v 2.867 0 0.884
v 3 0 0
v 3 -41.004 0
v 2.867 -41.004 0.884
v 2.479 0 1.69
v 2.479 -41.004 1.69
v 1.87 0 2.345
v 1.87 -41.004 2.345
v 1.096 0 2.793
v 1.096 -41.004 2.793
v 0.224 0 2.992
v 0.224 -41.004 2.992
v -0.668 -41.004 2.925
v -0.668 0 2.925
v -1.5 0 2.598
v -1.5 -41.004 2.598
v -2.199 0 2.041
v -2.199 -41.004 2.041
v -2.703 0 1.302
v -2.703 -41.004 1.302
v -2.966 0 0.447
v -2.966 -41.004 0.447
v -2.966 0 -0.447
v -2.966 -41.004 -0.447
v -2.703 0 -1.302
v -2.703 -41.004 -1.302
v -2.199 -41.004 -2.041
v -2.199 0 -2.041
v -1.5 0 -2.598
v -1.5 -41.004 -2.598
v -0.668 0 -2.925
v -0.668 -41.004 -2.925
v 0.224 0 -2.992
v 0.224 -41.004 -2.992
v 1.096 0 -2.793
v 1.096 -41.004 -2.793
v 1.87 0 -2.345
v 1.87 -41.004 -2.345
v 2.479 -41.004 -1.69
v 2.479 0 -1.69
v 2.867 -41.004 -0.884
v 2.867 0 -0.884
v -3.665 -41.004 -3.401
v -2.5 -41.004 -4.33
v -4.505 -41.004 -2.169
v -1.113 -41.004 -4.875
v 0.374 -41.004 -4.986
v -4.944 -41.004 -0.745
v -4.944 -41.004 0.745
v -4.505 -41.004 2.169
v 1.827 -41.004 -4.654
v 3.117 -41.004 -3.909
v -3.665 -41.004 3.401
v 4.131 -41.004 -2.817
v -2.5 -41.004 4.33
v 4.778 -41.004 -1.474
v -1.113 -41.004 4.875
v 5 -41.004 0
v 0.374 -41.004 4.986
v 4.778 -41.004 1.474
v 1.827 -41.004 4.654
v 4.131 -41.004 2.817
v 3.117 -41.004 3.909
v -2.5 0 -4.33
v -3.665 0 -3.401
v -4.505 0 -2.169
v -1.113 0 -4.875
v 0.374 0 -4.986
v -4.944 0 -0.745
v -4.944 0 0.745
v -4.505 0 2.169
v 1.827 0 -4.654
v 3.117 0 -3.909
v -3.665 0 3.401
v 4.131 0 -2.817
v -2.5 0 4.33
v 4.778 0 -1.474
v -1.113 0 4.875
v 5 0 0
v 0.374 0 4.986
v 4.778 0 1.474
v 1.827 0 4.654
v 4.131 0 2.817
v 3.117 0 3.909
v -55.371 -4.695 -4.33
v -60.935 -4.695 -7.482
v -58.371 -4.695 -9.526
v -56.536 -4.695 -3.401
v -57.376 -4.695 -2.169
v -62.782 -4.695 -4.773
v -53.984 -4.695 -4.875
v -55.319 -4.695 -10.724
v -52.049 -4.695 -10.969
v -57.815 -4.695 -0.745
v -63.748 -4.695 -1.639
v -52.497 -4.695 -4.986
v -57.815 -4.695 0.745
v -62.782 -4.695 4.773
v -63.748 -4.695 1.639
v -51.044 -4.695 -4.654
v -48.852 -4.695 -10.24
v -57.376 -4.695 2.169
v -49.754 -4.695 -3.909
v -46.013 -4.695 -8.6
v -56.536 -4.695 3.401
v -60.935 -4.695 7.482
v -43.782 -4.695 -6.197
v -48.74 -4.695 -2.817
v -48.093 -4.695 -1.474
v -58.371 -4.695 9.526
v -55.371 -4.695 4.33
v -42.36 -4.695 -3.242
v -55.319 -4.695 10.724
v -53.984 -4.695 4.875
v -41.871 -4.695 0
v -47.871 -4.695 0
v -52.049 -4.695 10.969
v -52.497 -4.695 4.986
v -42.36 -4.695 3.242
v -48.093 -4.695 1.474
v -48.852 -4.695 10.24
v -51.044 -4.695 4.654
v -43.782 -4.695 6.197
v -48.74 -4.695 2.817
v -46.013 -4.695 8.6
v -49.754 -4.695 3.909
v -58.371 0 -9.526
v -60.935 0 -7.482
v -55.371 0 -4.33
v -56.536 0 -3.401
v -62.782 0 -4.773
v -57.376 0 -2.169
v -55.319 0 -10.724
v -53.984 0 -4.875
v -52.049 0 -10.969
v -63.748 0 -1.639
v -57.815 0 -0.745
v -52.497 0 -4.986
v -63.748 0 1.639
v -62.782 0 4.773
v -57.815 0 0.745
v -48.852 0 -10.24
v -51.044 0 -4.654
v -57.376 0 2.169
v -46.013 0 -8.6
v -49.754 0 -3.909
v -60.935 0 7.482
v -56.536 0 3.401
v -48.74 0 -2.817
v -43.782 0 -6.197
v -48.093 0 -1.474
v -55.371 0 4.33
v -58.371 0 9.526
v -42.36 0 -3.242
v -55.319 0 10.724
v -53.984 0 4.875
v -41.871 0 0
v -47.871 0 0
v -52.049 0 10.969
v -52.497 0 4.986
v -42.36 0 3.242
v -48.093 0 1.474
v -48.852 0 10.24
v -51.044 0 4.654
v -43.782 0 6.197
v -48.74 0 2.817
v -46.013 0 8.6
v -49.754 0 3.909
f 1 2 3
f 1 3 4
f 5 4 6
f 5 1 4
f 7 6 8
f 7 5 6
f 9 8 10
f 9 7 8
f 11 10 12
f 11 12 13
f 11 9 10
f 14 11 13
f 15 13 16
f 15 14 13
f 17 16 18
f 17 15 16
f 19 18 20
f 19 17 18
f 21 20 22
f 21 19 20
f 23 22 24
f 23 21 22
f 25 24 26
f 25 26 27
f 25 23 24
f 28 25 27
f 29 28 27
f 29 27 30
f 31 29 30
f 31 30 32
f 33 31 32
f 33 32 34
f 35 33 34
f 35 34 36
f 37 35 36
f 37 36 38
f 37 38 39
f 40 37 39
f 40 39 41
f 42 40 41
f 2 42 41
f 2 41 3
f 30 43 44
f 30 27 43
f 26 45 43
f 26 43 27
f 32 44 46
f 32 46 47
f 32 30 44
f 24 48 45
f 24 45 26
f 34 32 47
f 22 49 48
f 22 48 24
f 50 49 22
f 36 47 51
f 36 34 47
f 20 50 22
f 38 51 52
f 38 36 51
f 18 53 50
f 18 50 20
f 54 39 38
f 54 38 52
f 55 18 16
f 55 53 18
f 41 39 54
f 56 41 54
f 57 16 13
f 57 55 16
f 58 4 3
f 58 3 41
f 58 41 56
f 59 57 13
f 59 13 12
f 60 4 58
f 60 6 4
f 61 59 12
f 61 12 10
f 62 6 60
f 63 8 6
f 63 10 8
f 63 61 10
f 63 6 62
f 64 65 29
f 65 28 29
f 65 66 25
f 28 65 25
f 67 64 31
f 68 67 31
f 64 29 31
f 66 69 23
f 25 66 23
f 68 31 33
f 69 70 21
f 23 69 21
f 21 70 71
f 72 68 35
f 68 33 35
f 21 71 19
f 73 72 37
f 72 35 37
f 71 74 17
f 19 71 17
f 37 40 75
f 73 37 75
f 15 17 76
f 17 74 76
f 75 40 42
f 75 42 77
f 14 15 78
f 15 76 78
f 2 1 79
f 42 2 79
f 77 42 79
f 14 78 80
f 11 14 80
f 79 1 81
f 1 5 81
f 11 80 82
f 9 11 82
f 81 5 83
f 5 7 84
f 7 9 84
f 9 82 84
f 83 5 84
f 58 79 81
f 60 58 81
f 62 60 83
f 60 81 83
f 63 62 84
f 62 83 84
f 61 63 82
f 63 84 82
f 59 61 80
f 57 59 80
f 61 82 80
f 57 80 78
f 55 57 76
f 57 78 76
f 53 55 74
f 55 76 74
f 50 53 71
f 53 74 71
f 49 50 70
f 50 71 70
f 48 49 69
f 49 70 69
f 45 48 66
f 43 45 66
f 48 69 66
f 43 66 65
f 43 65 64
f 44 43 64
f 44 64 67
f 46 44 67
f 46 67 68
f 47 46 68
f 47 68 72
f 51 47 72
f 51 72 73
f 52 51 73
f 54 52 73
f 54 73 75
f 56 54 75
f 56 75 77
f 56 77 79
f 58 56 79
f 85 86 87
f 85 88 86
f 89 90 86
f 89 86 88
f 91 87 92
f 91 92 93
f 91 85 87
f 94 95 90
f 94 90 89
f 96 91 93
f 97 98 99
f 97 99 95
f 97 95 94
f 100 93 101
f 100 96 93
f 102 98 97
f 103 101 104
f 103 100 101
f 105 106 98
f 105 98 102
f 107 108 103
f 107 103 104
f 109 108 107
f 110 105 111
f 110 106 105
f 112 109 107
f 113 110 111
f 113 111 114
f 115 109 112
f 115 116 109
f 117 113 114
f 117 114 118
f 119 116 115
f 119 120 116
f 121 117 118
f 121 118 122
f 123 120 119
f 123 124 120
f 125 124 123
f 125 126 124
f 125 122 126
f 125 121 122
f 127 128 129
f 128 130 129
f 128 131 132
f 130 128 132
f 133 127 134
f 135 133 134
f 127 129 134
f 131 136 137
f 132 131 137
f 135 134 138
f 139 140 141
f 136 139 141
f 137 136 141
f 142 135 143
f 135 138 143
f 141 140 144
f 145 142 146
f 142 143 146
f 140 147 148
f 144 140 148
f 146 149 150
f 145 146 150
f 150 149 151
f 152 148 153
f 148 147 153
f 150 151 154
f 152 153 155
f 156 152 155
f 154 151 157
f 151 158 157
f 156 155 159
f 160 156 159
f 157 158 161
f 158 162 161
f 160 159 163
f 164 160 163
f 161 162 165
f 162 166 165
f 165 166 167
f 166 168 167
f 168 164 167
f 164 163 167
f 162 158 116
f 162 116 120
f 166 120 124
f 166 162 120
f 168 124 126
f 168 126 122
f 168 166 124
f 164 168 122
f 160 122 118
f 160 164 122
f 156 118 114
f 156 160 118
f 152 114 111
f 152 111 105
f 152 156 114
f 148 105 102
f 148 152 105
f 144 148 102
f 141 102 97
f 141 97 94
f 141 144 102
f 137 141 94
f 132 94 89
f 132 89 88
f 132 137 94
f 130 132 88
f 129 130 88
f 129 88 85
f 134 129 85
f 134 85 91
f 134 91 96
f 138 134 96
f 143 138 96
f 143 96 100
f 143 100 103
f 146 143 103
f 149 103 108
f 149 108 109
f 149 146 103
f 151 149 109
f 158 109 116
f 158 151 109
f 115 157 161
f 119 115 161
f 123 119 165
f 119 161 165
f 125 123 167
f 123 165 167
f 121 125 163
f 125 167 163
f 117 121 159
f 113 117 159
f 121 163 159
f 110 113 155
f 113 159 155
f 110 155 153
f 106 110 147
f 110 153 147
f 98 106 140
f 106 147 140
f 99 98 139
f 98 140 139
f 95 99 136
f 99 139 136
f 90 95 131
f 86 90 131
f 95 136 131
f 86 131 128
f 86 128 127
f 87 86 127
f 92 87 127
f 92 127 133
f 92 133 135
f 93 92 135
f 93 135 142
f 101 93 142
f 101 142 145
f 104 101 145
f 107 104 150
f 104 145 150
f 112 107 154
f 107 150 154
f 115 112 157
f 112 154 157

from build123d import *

# Parameters (mm, degrees)
F0_R     = 5
F0_R_2   = 3
F1_DEPTH = 41.0036
F0_R_3   = 11
F2_DEPTH = 4.69513


with BuildPart() as f1:
    # F0 (on Front) → F1 (new body)
    with BuildSketch(Plane.XZ):
        Circle(F0_R)
        Circle(F0_R_2, mode=Mode.SUBTRACT)
    extrude(amount=F1_DEPTH)

    # F0 (on Front) → F2 (join)
    with BuildSketch(Plane.XZ):
        Circle(F0_R)
        Circle(F0_R_2, mode=Mode.SUBTRACT)
        with Locations((-52.871026, 0)):
            Circle(F0_R_3)
        with Locations((-52.871026, 0)):
            Circle(F0_R, mode=Mode.SUBTRACT)
    extrude(amount=F2_DEPTH)


solid = f1.part
